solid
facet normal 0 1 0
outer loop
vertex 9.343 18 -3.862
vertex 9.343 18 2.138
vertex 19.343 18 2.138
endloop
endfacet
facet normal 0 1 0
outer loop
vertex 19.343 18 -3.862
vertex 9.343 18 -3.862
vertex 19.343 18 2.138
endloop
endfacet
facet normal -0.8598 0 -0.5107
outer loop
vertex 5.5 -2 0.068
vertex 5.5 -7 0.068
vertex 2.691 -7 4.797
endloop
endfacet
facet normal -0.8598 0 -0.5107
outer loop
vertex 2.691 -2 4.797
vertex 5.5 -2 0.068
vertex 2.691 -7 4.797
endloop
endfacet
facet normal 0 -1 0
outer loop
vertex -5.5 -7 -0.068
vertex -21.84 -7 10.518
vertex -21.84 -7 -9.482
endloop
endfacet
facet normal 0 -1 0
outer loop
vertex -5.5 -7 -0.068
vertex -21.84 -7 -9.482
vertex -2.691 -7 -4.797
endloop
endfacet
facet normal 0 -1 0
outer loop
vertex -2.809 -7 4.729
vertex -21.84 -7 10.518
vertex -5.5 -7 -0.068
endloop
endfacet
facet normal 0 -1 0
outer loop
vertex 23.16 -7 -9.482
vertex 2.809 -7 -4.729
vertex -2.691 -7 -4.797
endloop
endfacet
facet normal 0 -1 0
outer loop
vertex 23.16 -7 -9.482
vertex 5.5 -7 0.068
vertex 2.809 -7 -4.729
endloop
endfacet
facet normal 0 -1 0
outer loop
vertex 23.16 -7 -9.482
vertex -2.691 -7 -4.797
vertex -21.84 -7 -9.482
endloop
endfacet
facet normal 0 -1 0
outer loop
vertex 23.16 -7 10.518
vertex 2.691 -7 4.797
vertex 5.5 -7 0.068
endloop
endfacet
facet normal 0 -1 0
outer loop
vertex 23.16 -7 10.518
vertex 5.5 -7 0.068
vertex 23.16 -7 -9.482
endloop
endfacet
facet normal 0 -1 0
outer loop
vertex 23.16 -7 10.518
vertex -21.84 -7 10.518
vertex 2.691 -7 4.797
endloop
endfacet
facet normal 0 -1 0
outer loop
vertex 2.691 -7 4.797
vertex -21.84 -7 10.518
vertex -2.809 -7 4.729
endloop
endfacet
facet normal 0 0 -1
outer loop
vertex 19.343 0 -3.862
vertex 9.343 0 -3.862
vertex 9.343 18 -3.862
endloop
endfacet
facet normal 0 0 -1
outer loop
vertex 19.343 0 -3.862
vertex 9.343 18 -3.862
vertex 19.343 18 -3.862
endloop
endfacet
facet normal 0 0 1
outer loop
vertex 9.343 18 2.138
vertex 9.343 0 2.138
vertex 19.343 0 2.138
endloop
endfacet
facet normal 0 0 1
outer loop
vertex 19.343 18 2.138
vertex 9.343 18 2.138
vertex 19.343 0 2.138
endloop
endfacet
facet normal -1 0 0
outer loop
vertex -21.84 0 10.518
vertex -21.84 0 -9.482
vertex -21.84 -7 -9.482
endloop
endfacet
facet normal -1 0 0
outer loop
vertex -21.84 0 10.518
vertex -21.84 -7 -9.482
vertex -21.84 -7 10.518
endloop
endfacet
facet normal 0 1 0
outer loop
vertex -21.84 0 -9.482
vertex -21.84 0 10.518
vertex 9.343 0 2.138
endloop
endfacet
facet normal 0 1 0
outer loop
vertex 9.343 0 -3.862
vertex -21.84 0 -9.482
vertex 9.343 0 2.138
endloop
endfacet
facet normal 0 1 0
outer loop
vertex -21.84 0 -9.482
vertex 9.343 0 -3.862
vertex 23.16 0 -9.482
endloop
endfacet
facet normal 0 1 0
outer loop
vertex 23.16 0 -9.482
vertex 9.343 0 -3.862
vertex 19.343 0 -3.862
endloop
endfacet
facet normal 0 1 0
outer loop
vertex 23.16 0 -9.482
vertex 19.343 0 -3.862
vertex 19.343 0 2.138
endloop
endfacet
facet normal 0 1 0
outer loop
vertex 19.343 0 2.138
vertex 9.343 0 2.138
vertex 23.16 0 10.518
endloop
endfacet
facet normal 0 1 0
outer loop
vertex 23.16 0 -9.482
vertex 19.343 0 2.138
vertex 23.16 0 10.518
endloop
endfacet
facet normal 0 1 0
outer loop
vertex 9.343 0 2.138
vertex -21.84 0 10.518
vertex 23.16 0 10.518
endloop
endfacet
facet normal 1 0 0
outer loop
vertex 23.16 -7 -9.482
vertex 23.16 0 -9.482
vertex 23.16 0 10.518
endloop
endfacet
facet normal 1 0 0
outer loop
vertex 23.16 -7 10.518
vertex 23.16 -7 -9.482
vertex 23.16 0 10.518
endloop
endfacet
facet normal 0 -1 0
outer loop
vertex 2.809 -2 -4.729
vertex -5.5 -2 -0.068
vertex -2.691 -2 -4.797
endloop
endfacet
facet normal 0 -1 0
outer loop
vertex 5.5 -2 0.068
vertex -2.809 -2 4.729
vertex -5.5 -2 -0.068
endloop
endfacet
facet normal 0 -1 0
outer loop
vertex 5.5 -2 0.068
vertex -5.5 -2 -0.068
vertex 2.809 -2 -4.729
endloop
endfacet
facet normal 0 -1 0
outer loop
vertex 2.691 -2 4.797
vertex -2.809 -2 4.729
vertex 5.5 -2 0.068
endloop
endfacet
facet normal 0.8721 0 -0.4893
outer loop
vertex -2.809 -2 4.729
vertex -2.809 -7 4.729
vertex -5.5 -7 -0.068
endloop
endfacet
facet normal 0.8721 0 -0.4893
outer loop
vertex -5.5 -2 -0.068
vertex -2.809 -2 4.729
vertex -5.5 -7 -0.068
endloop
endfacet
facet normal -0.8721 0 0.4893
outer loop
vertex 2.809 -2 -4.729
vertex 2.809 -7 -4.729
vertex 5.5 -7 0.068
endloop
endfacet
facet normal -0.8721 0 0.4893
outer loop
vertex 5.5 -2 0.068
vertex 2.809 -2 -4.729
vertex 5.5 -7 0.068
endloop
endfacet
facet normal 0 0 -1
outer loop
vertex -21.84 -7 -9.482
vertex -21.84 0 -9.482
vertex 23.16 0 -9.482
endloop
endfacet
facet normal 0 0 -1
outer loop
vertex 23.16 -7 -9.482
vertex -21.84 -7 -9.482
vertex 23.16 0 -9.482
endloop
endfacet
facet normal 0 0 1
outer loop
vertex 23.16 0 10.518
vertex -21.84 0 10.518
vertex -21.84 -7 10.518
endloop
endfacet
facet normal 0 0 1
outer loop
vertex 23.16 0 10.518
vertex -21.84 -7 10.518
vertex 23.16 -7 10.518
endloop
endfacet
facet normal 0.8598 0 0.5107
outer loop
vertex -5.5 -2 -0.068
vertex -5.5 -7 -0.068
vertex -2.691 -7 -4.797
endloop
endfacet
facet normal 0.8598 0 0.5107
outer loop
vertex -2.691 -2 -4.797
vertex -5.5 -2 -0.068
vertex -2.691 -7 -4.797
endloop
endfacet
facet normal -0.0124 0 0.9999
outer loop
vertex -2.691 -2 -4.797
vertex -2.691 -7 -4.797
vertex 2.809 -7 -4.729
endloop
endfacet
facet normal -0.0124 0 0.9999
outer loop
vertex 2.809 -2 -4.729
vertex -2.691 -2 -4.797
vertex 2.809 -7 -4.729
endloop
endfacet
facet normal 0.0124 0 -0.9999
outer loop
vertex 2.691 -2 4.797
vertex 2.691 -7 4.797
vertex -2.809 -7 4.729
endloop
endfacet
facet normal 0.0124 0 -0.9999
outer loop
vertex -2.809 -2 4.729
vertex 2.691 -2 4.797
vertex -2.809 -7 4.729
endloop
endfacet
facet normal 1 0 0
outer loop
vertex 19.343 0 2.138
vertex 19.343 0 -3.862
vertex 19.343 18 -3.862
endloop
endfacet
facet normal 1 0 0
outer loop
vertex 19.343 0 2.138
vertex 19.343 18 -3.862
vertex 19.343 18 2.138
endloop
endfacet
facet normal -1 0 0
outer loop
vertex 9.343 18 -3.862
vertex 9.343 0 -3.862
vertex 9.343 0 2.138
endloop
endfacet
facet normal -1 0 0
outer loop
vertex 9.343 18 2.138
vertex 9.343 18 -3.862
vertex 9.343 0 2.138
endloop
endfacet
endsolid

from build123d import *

# Parameters (mm, degrees)
F0_W     = 45
F0_H     = 20
F1_DEPTH = 7
F3_DEPTH = 5
F4_W     = 10
F4_H     = 6
F5_DEPTH = 25


with BuildPart() as f1:
    # F0 (on Front) → F1 (new body)
    with BuildSketch(Plane.XZ):
        with Locations((0.659725, 0.518122)):
            Rectangle(F0_W, F0_H)
    extrude(amount=F1_DEPTH)

    # F2 (on face) → F3 (cut)
    with BuildSketch(Plane.XZ.offset(7)):
        Polygon((-2.808699, 4.728764), (-5.499579, -0.068023), (-2.69088, -4.796787), (2.808699, -4.728764), (5.499579, 0.068023), (2.69088, 4.796787), align=None)
    extrude(amount=-F3_DEPTH, mode=Mode.SUBTRACT)

    # F4 (on face) → F5 (join)
    with BuildSketch(Plane.XZ.offset(7)):
        with Locations((14.343088, -0.862489)):
            Rectangle(F4_W, F4_H)
    extrude(amount=-F5_DEPTH)


solid = f1.part
